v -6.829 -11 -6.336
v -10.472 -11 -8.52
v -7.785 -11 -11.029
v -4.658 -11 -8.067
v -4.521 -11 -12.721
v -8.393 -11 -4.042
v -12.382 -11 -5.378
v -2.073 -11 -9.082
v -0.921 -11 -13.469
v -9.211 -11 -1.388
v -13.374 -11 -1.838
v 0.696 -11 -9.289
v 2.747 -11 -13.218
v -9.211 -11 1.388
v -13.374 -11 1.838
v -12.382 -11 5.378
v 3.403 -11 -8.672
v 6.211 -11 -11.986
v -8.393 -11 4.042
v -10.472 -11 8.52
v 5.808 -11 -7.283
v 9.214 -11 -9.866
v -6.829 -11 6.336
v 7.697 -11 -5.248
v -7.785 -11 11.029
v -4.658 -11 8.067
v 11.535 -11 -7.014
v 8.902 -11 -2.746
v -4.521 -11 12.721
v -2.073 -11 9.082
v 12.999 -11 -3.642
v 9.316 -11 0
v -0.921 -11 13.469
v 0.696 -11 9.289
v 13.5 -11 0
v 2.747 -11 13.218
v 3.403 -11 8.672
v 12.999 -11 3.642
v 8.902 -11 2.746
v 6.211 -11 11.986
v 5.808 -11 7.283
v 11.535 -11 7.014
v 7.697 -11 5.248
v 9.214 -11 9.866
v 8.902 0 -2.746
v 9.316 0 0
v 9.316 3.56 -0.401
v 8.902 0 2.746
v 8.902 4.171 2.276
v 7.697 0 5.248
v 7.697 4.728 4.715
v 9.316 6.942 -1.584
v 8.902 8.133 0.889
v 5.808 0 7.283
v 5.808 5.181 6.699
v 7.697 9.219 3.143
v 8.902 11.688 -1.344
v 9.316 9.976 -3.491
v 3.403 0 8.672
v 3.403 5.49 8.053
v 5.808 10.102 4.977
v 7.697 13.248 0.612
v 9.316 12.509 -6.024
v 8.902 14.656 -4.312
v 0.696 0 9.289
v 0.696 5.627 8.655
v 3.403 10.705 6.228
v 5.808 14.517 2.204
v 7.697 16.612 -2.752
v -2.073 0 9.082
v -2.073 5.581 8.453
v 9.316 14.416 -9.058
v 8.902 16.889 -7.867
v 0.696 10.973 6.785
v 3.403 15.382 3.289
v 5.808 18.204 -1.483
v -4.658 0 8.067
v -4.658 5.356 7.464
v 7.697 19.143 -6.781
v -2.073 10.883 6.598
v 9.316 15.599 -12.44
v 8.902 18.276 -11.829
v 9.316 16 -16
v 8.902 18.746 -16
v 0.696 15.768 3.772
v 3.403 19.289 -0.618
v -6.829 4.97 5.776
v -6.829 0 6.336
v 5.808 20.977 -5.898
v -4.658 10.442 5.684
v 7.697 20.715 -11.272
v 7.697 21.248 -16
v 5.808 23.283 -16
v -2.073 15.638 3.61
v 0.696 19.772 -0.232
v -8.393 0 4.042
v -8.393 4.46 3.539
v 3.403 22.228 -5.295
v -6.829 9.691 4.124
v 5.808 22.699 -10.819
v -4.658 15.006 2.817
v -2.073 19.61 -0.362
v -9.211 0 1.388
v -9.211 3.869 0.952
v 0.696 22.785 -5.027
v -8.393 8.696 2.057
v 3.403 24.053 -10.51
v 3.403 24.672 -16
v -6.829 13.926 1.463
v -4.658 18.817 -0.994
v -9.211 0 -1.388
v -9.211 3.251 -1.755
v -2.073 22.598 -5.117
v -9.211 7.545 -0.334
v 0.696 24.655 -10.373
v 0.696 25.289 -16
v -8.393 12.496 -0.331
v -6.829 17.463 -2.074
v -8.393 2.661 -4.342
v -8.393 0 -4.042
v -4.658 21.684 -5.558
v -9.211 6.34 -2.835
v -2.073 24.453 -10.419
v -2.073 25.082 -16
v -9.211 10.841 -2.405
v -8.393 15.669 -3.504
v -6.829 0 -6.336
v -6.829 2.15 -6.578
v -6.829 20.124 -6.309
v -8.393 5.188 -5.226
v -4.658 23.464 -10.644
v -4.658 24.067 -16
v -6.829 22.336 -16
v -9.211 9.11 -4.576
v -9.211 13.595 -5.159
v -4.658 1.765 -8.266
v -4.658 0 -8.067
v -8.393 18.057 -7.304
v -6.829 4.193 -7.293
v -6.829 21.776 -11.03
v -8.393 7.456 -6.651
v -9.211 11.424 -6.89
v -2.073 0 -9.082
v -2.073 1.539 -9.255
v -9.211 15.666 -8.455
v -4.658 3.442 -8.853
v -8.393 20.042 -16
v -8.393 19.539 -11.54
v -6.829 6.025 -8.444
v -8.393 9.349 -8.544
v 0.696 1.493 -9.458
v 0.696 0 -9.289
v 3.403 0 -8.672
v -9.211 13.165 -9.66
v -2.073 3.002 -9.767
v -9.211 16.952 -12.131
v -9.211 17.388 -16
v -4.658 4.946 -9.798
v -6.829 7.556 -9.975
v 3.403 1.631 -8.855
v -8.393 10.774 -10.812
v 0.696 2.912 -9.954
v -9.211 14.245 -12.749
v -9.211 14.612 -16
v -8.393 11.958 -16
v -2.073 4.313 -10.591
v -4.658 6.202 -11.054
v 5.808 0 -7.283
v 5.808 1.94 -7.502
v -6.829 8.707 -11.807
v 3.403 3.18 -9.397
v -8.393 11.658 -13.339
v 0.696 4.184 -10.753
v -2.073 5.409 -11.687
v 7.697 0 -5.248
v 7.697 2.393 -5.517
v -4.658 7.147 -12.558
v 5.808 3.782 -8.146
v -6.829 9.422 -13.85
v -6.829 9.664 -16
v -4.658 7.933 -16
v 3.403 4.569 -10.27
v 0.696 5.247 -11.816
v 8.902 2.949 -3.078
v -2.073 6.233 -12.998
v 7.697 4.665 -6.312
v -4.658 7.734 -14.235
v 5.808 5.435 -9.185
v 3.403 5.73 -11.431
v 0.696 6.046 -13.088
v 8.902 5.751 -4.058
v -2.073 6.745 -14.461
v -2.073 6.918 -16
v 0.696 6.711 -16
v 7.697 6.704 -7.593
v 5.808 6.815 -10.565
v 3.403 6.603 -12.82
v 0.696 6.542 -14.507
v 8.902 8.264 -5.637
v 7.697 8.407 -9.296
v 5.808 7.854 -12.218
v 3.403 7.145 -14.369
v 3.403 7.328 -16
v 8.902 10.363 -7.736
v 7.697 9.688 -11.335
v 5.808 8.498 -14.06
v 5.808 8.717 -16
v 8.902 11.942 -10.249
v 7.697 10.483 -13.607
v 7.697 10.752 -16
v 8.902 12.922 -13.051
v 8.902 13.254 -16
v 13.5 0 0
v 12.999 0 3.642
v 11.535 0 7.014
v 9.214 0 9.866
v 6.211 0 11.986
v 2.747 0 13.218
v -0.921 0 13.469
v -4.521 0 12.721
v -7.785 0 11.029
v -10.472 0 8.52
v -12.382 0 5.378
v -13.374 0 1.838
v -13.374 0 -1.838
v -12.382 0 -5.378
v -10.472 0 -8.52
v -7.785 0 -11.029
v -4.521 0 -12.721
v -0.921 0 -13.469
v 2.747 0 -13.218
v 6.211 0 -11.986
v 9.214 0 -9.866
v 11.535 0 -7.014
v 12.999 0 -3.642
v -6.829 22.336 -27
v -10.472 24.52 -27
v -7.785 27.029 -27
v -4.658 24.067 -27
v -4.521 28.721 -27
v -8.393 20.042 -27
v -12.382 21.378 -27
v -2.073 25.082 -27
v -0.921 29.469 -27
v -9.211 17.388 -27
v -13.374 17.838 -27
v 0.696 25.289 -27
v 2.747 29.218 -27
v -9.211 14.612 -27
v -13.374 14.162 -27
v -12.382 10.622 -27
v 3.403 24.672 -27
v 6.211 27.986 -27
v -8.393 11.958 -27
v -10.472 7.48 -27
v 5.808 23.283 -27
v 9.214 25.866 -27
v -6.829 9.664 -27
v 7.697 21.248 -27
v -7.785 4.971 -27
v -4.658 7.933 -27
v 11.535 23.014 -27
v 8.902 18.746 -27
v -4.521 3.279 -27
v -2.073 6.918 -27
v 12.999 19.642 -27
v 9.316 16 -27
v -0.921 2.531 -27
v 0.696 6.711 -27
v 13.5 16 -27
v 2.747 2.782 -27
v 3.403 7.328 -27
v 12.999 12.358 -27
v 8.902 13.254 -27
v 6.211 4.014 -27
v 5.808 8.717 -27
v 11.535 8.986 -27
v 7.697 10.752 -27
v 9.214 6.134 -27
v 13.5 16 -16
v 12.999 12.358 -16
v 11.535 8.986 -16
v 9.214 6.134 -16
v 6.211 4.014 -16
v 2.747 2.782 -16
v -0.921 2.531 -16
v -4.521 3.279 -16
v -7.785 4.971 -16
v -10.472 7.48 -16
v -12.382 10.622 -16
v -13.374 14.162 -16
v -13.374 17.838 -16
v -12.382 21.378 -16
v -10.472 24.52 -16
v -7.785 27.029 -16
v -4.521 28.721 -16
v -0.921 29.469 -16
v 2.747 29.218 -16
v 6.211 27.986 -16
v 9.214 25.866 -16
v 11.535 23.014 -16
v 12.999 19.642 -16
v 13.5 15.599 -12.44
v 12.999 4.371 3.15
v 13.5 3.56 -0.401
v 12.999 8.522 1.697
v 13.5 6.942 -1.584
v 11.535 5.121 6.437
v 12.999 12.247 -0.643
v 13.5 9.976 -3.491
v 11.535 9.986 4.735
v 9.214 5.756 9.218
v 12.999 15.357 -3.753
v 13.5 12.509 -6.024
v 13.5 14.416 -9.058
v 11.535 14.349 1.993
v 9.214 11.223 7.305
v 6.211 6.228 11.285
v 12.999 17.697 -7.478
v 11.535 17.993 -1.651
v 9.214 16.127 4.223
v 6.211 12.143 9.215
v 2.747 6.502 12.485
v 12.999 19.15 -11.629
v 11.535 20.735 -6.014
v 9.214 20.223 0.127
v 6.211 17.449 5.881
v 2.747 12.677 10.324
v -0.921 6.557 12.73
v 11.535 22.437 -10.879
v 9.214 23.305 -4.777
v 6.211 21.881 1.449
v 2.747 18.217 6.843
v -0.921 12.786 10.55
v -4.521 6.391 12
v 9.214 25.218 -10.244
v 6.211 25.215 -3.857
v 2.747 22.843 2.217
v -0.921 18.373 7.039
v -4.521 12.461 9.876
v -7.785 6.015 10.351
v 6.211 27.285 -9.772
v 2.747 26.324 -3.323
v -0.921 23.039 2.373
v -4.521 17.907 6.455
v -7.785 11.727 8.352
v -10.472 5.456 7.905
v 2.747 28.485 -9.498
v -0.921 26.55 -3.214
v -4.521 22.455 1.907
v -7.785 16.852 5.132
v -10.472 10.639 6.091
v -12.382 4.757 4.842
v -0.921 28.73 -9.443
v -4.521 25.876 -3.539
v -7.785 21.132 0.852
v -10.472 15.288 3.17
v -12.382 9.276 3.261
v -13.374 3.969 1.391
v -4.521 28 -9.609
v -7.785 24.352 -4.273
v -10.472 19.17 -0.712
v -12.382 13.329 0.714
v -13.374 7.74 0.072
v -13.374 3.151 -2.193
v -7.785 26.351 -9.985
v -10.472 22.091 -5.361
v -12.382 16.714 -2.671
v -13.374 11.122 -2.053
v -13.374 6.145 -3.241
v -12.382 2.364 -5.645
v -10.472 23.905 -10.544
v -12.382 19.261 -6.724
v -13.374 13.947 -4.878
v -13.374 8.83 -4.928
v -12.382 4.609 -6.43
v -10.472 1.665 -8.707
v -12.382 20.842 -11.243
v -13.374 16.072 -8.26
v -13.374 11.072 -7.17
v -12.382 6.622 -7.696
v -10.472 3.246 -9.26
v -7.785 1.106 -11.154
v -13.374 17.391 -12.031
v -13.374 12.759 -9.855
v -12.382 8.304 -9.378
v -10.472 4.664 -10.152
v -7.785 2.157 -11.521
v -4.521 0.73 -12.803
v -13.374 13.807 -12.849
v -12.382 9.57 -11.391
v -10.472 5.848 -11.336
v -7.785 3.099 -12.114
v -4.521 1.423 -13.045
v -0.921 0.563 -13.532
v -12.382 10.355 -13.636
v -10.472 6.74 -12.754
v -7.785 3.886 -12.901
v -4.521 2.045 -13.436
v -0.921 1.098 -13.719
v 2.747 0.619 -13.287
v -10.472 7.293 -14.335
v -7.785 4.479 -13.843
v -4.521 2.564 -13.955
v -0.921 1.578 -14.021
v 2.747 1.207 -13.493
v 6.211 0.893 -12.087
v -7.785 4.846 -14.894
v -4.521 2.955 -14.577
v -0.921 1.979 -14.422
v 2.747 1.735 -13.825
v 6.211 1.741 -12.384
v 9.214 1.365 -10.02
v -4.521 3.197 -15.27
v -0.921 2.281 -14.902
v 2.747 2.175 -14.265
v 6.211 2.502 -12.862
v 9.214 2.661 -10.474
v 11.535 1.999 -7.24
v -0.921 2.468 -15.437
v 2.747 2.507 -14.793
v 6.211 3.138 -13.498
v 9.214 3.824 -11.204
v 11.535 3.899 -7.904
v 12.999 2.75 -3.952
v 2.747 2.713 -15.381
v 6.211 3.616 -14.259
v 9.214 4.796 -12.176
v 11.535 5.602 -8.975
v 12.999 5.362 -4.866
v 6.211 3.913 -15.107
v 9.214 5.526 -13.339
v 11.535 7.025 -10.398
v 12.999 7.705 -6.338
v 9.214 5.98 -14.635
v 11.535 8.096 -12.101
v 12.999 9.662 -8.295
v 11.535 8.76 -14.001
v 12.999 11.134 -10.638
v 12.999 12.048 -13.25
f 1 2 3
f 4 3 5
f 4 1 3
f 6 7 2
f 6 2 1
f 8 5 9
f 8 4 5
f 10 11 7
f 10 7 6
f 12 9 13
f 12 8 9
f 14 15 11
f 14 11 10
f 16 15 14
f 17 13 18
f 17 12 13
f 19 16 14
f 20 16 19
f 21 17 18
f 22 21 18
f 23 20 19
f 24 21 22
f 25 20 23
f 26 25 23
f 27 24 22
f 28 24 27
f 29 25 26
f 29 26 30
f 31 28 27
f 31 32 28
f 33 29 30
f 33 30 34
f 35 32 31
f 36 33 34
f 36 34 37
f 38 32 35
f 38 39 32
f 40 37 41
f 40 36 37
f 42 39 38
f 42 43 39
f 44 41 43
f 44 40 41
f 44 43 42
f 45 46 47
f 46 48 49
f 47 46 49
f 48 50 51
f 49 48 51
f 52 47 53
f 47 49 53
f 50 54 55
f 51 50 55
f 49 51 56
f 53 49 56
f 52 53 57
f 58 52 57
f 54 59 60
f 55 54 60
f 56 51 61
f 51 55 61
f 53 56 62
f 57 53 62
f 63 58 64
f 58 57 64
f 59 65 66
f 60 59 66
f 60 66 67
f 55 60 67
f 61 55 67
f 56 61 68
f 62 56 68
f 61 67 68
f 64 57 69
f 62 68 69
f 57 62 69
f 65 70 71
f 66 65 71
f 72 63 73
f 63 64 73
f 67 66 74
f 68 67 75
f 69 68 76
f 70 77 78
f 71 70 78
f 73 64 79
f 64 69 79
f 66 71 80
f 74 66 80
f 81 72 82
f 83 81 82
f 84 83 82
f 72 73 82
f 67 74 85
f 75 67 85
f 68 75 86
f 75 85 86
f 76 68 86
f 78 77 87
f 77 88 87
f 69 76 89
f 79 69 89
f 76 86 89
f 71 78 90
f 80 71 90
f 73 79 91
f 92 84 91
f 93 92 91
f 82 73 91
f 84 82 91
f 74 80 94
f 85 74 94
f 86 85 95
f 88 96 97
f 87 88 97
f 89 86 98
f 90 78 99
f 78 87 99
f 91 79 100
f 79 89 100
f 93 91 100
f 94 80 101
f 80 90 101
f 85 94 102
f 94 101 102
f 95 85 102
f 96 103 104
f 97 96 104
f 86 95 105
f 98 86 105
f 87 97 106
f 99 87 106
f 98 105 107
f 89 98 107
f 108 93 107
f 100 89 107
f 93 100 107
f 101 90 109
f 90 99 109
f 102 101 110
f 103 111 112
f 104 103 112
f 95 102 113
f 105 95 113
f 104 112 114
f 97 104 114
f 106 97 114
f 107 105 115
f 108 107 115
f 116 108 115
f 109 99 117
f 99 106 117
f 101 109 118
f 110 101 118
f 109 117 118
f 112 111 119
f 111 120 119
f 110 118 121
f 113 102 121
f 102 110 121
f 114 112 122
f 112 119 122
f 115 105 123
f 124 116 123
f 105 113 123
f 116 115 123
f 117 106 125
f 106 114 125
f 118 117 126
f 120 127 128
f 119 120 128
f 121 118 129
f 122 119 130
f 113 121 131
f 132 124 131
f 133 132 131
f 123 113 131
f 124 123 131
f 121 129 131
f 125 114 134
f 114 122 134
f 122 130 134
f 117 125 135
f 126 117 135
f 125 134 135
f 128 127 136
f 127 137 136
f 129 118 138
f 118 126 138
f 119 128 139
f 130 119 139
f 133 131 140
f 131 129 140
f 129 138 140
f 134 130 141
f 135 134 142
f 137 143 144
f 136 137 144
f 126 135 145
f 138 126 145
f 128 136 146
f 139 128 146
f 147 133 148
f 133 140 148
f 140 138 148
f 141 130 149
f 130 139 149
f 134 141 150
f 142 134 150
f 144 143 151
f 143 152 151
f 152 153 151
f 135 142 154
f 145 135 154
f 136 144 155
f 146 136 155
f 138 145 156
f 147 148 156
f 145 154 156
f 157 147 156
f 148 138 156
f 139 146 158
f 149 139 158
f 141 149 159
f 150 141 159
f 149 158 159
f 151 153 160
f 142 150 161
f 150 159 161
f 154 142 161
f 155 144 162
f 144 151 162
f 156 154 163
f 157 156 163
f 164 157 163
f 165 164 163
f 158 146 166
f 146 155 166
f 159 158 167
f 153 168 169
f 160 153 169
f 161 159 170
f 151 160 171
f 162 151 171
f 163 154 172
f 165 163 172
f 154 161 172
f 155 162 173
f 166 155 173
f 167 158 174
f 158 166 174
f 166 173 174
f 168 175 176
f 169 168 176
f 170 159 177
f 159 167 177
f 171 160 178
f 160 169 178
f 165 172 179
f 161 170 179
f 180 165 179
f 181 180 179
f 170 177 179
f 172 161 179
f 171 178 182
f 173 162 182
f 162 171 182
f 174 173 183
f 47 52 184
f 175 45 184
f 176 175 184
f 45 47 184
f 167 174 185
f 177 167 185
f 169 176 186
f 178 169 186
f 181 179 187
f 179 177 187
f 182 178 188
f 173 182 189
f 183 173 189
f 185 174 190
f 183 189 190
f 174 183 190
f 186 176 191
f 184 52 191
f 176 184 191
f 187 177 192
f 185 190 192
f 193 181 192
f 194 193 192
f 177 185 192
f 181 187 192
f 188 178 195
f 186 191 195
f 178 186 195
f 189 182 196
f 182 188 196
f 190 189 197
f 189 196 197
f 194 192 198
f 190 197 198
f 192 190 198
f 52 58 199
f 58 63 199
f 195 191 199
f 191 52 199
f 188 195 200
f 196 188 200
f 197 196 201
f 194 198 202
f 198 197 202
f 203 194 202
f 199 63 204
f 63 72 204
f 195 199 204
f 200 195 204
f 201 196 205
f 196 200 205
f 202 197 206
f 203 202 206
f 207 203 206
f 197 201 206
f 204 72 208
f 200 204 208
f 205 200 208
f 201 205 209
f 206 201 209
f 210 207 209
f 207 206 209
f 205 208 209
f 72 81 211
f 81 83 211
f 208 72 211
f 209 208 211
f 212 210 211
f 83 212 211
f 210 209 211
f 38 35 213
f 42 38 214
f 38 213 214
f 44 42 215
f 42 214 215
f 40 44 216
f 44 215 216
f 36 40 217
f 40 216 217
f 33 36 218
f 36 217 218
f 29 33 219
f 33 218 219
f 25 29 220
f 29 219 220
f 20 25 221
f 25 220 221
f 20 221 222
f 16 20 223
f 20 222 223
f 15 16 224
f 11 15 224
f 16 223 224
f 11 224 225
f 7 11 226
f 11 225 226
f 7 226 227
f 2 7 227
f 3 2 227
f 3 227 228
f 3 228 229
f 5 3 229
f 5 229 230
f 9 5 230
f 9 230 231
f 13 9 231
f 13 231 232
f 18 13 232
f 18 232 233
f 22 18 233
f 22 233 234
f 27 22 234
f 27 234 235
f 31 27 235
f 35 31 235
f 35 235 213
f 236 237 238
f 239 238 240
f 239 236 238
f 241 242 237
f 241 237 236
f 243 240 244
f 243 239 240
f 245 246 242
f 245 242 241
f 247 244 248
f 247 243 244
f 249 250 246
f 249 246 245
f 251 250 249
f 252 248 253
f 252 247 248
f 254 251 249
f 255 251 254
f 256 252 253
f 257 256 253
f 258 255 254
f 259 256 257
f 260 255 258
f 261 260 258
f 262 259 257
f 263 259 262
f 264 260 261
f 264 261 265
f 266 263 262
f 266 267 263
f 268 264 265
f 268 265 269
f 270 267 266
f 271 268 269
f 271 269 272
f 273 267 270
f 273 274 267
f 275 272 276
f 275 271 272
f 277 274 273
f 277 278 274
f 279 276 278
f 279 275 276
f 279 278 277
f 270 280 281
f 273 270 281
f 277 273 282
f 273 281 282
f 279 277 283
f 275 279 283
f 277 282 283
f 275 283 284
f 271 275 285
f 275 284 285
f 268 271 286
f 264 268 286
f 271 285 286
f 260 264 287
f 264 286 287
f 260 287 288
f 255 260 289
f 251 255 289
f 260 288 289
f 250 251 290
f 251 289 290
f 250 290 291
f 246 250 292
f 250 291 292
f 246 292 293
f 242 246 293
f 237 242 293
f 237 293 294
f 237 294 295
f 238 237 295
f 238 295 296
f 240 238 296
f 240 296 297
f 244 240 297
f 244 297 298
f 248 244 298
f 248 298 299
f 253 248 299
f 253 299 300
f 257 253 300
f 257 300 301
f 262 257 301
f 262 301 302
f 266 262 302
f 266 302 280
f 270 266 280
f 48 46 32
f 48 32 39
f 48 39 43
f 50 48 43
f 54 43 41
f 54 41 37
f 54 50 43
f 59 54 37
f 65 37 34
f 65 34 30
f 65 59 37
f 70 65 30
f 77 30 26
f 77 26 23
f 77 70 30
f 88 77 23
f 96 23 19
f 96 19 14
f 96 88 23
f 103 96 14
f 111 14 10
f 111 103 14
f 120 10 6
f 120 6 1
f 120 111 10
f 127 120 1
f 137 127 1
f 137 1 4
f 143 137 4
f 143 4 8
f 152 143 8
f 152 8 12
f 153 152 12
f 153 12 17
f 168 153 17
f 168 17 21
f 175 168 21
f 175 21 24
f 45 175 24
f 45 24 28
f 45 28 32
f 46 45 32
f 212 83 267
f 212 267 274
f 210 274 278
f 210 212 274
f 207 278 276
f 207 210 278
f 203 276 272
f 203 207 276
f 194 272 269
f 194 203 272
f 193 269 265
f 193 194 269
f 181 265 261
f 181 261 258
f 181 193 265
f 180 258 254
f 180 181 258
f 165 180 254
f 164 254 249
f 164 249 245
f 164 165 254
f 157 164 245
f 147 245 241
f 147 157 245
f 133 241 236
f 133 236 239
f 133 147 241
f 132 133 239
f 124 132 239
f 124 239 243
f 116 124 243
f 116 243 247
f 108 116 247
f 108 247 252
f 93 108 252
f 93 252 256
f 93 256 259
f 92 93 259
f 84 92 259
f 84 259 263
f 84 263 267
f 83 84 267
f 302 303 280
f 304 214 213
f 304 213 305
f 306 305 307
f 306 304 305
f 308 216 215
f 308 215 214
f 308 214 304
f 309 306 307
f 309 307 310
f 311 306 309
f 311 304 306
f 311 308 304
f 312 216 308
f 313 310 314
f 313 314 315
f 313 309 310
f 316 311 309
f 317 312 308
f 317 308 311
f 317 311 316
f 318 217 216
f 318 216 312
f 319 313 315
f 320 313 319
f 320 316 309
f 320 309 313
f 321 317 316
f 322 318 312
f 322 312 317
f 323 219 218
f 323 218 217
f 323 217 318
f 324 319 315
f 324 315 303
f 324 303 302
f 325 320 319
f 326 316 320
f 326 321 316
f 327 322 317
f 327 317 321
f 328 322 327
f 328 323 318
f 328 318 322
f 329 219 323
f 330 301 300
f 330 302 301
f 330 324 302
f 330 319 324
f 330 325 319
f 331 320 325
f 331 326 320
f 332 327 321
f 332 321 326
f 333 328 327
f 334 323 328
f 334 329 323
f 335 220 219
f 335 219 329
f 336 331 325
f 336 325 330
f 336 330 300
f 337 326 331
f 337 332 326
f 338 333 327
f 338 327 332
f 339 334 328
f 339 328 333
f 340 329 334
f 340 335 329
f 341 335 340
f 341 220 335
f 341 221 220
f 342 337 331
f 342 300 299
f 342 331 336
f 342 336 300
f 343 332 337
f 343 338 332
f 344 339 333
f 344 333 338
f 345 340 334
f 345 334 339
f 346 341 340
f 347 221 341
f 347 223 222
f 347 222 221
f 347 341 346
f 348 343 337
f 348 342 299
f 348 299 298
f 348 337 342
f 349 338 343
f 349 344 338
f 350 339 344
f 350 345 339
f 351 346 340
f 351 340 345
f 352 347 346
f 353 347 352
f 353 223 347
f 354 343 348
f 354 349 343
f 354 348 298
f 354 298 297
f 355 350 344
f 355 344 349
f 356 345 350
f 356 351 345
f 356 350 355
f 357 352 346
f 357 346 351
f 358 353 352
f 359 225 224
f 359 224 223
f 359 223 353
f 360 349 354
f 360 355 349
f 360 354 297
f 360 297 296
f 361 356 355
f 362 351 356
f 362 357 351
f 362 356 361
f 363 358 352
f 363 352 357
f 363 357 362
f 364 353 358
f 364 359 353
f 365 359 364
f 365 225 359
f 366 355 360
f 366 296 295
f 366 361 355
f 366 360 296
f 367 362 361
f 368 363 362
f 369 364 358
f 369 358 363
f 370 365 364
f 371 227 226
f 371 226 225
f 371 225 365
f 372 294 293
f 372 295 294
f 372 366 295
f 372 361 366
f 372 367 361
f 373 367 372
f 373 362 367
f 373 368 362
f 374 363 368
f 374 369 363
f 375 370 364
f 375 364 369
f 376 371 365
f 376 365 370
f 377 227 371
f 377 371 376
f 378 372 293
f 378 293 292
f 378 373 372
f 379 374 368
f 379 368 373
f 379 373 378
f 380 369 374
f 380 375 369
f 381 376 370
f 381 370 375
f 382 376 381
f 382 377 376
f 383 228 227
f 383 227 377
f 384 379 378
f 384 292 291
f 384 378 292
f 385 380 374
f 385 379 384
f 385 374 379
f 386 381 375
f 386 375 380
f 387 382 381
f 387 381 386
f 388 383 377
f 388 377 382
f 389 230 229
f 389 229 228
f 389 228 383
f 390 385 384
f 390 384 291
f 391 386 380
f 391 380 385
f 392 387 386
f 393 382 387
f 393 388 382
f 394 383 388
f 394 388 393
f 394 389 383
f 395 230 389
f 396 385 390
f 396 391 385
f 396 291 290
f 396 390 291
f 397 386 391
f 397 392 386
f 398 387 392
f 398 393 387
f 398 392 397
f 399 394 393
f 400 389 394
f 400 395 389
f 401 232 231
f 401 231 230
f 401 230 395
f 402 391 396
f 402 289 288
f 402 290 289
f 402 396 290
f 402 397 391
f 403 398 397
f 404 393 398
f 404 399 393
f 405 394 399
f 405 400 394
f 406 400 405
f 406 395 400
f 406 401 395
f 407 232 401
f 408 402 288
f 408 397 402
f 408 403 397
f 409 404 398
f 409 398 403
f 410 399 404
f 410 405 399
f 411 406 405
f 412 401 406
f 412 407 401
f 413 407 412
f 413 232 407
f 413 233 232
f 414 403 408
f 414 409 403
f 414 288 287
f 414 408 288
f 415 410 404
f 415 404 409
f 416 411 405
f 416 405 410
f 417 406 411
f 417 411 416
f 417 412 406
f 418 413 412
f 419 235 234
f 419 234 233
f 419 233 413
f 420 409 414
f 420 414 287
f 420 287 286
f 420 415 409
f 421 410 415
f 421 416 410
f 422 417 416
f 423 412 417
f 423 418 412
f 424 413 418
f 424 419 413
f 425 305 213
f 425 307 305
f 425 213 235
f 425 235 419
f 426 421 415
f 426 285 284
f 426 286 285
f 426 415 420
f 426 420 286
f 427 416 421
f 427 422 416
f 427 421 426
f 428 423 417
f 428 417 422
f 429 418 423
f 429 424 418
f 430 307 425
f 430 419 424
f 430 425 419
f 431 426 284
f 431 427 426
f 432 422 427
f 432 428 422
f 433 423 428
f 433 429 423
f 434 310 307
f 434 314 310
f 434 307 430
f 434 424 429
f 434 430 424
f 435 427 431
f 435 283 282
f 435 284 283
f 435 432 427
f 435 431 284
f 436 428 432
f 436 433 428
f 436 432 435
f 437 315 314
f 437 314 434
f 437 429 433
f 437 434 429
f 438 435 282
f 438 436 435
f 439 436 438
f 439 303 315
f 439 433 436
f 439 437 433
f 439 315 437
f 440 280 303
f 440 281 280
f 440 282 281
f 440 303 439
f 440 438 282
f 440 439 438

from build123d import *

# Parameters (mm, degrees)
F0_R        = 13.5
F0_R_2      = 9.3155
F1_DEPTH    = 11
F1_FACE_R   = 13.5
F1_FACE_R_2 = 9.3155
F4_R        = 13.5
F4_R_2      = 9.3155
F5_DEPTH    = 11


with BuildPart() as f1:
    # F0 (on Front) → F1 (new body)
    with BuildSketch(Plane.XZ):
        Circle(F0_R)
        Circle(F0_R_2, mode=Mode.SUBTRACT)
    extrude(amount=F1_DEPTH)

    # F3: sweep along a path in F2
    with BuildLine(Plane.YZ) as f3_path:
        ThreePointArc((0, 0), (11.313708, -4.686292), (16, -16))
    # F1_face (on face) → F3 (sweep)
    with BuildSketch(Plane(origin=(0, 0, 0), x_dir=(1, 0, 0), z_dir=(0, 1, 0))):
        Circle(F1_FACE_R)
        Circle(F1_FACE_R_2, mode=Mode.SUBTRACT)
    sweep(path=f3_path.line)

    # F4 (on face) → F5 (join)
    with BuildSketch(Plane(origin=(0, 0, -16), x_dir=(1, 0, 0), z_dir=(0, 0, -1))):
        with Locations((0, -16)):
            Circle(F4_R)
        with Locations((0, -16)):
            Circle(F4_R_2, mode=Mode.SUBTRACT)
    extrude(amount=F5_DEPTH)


solid = f1.part
